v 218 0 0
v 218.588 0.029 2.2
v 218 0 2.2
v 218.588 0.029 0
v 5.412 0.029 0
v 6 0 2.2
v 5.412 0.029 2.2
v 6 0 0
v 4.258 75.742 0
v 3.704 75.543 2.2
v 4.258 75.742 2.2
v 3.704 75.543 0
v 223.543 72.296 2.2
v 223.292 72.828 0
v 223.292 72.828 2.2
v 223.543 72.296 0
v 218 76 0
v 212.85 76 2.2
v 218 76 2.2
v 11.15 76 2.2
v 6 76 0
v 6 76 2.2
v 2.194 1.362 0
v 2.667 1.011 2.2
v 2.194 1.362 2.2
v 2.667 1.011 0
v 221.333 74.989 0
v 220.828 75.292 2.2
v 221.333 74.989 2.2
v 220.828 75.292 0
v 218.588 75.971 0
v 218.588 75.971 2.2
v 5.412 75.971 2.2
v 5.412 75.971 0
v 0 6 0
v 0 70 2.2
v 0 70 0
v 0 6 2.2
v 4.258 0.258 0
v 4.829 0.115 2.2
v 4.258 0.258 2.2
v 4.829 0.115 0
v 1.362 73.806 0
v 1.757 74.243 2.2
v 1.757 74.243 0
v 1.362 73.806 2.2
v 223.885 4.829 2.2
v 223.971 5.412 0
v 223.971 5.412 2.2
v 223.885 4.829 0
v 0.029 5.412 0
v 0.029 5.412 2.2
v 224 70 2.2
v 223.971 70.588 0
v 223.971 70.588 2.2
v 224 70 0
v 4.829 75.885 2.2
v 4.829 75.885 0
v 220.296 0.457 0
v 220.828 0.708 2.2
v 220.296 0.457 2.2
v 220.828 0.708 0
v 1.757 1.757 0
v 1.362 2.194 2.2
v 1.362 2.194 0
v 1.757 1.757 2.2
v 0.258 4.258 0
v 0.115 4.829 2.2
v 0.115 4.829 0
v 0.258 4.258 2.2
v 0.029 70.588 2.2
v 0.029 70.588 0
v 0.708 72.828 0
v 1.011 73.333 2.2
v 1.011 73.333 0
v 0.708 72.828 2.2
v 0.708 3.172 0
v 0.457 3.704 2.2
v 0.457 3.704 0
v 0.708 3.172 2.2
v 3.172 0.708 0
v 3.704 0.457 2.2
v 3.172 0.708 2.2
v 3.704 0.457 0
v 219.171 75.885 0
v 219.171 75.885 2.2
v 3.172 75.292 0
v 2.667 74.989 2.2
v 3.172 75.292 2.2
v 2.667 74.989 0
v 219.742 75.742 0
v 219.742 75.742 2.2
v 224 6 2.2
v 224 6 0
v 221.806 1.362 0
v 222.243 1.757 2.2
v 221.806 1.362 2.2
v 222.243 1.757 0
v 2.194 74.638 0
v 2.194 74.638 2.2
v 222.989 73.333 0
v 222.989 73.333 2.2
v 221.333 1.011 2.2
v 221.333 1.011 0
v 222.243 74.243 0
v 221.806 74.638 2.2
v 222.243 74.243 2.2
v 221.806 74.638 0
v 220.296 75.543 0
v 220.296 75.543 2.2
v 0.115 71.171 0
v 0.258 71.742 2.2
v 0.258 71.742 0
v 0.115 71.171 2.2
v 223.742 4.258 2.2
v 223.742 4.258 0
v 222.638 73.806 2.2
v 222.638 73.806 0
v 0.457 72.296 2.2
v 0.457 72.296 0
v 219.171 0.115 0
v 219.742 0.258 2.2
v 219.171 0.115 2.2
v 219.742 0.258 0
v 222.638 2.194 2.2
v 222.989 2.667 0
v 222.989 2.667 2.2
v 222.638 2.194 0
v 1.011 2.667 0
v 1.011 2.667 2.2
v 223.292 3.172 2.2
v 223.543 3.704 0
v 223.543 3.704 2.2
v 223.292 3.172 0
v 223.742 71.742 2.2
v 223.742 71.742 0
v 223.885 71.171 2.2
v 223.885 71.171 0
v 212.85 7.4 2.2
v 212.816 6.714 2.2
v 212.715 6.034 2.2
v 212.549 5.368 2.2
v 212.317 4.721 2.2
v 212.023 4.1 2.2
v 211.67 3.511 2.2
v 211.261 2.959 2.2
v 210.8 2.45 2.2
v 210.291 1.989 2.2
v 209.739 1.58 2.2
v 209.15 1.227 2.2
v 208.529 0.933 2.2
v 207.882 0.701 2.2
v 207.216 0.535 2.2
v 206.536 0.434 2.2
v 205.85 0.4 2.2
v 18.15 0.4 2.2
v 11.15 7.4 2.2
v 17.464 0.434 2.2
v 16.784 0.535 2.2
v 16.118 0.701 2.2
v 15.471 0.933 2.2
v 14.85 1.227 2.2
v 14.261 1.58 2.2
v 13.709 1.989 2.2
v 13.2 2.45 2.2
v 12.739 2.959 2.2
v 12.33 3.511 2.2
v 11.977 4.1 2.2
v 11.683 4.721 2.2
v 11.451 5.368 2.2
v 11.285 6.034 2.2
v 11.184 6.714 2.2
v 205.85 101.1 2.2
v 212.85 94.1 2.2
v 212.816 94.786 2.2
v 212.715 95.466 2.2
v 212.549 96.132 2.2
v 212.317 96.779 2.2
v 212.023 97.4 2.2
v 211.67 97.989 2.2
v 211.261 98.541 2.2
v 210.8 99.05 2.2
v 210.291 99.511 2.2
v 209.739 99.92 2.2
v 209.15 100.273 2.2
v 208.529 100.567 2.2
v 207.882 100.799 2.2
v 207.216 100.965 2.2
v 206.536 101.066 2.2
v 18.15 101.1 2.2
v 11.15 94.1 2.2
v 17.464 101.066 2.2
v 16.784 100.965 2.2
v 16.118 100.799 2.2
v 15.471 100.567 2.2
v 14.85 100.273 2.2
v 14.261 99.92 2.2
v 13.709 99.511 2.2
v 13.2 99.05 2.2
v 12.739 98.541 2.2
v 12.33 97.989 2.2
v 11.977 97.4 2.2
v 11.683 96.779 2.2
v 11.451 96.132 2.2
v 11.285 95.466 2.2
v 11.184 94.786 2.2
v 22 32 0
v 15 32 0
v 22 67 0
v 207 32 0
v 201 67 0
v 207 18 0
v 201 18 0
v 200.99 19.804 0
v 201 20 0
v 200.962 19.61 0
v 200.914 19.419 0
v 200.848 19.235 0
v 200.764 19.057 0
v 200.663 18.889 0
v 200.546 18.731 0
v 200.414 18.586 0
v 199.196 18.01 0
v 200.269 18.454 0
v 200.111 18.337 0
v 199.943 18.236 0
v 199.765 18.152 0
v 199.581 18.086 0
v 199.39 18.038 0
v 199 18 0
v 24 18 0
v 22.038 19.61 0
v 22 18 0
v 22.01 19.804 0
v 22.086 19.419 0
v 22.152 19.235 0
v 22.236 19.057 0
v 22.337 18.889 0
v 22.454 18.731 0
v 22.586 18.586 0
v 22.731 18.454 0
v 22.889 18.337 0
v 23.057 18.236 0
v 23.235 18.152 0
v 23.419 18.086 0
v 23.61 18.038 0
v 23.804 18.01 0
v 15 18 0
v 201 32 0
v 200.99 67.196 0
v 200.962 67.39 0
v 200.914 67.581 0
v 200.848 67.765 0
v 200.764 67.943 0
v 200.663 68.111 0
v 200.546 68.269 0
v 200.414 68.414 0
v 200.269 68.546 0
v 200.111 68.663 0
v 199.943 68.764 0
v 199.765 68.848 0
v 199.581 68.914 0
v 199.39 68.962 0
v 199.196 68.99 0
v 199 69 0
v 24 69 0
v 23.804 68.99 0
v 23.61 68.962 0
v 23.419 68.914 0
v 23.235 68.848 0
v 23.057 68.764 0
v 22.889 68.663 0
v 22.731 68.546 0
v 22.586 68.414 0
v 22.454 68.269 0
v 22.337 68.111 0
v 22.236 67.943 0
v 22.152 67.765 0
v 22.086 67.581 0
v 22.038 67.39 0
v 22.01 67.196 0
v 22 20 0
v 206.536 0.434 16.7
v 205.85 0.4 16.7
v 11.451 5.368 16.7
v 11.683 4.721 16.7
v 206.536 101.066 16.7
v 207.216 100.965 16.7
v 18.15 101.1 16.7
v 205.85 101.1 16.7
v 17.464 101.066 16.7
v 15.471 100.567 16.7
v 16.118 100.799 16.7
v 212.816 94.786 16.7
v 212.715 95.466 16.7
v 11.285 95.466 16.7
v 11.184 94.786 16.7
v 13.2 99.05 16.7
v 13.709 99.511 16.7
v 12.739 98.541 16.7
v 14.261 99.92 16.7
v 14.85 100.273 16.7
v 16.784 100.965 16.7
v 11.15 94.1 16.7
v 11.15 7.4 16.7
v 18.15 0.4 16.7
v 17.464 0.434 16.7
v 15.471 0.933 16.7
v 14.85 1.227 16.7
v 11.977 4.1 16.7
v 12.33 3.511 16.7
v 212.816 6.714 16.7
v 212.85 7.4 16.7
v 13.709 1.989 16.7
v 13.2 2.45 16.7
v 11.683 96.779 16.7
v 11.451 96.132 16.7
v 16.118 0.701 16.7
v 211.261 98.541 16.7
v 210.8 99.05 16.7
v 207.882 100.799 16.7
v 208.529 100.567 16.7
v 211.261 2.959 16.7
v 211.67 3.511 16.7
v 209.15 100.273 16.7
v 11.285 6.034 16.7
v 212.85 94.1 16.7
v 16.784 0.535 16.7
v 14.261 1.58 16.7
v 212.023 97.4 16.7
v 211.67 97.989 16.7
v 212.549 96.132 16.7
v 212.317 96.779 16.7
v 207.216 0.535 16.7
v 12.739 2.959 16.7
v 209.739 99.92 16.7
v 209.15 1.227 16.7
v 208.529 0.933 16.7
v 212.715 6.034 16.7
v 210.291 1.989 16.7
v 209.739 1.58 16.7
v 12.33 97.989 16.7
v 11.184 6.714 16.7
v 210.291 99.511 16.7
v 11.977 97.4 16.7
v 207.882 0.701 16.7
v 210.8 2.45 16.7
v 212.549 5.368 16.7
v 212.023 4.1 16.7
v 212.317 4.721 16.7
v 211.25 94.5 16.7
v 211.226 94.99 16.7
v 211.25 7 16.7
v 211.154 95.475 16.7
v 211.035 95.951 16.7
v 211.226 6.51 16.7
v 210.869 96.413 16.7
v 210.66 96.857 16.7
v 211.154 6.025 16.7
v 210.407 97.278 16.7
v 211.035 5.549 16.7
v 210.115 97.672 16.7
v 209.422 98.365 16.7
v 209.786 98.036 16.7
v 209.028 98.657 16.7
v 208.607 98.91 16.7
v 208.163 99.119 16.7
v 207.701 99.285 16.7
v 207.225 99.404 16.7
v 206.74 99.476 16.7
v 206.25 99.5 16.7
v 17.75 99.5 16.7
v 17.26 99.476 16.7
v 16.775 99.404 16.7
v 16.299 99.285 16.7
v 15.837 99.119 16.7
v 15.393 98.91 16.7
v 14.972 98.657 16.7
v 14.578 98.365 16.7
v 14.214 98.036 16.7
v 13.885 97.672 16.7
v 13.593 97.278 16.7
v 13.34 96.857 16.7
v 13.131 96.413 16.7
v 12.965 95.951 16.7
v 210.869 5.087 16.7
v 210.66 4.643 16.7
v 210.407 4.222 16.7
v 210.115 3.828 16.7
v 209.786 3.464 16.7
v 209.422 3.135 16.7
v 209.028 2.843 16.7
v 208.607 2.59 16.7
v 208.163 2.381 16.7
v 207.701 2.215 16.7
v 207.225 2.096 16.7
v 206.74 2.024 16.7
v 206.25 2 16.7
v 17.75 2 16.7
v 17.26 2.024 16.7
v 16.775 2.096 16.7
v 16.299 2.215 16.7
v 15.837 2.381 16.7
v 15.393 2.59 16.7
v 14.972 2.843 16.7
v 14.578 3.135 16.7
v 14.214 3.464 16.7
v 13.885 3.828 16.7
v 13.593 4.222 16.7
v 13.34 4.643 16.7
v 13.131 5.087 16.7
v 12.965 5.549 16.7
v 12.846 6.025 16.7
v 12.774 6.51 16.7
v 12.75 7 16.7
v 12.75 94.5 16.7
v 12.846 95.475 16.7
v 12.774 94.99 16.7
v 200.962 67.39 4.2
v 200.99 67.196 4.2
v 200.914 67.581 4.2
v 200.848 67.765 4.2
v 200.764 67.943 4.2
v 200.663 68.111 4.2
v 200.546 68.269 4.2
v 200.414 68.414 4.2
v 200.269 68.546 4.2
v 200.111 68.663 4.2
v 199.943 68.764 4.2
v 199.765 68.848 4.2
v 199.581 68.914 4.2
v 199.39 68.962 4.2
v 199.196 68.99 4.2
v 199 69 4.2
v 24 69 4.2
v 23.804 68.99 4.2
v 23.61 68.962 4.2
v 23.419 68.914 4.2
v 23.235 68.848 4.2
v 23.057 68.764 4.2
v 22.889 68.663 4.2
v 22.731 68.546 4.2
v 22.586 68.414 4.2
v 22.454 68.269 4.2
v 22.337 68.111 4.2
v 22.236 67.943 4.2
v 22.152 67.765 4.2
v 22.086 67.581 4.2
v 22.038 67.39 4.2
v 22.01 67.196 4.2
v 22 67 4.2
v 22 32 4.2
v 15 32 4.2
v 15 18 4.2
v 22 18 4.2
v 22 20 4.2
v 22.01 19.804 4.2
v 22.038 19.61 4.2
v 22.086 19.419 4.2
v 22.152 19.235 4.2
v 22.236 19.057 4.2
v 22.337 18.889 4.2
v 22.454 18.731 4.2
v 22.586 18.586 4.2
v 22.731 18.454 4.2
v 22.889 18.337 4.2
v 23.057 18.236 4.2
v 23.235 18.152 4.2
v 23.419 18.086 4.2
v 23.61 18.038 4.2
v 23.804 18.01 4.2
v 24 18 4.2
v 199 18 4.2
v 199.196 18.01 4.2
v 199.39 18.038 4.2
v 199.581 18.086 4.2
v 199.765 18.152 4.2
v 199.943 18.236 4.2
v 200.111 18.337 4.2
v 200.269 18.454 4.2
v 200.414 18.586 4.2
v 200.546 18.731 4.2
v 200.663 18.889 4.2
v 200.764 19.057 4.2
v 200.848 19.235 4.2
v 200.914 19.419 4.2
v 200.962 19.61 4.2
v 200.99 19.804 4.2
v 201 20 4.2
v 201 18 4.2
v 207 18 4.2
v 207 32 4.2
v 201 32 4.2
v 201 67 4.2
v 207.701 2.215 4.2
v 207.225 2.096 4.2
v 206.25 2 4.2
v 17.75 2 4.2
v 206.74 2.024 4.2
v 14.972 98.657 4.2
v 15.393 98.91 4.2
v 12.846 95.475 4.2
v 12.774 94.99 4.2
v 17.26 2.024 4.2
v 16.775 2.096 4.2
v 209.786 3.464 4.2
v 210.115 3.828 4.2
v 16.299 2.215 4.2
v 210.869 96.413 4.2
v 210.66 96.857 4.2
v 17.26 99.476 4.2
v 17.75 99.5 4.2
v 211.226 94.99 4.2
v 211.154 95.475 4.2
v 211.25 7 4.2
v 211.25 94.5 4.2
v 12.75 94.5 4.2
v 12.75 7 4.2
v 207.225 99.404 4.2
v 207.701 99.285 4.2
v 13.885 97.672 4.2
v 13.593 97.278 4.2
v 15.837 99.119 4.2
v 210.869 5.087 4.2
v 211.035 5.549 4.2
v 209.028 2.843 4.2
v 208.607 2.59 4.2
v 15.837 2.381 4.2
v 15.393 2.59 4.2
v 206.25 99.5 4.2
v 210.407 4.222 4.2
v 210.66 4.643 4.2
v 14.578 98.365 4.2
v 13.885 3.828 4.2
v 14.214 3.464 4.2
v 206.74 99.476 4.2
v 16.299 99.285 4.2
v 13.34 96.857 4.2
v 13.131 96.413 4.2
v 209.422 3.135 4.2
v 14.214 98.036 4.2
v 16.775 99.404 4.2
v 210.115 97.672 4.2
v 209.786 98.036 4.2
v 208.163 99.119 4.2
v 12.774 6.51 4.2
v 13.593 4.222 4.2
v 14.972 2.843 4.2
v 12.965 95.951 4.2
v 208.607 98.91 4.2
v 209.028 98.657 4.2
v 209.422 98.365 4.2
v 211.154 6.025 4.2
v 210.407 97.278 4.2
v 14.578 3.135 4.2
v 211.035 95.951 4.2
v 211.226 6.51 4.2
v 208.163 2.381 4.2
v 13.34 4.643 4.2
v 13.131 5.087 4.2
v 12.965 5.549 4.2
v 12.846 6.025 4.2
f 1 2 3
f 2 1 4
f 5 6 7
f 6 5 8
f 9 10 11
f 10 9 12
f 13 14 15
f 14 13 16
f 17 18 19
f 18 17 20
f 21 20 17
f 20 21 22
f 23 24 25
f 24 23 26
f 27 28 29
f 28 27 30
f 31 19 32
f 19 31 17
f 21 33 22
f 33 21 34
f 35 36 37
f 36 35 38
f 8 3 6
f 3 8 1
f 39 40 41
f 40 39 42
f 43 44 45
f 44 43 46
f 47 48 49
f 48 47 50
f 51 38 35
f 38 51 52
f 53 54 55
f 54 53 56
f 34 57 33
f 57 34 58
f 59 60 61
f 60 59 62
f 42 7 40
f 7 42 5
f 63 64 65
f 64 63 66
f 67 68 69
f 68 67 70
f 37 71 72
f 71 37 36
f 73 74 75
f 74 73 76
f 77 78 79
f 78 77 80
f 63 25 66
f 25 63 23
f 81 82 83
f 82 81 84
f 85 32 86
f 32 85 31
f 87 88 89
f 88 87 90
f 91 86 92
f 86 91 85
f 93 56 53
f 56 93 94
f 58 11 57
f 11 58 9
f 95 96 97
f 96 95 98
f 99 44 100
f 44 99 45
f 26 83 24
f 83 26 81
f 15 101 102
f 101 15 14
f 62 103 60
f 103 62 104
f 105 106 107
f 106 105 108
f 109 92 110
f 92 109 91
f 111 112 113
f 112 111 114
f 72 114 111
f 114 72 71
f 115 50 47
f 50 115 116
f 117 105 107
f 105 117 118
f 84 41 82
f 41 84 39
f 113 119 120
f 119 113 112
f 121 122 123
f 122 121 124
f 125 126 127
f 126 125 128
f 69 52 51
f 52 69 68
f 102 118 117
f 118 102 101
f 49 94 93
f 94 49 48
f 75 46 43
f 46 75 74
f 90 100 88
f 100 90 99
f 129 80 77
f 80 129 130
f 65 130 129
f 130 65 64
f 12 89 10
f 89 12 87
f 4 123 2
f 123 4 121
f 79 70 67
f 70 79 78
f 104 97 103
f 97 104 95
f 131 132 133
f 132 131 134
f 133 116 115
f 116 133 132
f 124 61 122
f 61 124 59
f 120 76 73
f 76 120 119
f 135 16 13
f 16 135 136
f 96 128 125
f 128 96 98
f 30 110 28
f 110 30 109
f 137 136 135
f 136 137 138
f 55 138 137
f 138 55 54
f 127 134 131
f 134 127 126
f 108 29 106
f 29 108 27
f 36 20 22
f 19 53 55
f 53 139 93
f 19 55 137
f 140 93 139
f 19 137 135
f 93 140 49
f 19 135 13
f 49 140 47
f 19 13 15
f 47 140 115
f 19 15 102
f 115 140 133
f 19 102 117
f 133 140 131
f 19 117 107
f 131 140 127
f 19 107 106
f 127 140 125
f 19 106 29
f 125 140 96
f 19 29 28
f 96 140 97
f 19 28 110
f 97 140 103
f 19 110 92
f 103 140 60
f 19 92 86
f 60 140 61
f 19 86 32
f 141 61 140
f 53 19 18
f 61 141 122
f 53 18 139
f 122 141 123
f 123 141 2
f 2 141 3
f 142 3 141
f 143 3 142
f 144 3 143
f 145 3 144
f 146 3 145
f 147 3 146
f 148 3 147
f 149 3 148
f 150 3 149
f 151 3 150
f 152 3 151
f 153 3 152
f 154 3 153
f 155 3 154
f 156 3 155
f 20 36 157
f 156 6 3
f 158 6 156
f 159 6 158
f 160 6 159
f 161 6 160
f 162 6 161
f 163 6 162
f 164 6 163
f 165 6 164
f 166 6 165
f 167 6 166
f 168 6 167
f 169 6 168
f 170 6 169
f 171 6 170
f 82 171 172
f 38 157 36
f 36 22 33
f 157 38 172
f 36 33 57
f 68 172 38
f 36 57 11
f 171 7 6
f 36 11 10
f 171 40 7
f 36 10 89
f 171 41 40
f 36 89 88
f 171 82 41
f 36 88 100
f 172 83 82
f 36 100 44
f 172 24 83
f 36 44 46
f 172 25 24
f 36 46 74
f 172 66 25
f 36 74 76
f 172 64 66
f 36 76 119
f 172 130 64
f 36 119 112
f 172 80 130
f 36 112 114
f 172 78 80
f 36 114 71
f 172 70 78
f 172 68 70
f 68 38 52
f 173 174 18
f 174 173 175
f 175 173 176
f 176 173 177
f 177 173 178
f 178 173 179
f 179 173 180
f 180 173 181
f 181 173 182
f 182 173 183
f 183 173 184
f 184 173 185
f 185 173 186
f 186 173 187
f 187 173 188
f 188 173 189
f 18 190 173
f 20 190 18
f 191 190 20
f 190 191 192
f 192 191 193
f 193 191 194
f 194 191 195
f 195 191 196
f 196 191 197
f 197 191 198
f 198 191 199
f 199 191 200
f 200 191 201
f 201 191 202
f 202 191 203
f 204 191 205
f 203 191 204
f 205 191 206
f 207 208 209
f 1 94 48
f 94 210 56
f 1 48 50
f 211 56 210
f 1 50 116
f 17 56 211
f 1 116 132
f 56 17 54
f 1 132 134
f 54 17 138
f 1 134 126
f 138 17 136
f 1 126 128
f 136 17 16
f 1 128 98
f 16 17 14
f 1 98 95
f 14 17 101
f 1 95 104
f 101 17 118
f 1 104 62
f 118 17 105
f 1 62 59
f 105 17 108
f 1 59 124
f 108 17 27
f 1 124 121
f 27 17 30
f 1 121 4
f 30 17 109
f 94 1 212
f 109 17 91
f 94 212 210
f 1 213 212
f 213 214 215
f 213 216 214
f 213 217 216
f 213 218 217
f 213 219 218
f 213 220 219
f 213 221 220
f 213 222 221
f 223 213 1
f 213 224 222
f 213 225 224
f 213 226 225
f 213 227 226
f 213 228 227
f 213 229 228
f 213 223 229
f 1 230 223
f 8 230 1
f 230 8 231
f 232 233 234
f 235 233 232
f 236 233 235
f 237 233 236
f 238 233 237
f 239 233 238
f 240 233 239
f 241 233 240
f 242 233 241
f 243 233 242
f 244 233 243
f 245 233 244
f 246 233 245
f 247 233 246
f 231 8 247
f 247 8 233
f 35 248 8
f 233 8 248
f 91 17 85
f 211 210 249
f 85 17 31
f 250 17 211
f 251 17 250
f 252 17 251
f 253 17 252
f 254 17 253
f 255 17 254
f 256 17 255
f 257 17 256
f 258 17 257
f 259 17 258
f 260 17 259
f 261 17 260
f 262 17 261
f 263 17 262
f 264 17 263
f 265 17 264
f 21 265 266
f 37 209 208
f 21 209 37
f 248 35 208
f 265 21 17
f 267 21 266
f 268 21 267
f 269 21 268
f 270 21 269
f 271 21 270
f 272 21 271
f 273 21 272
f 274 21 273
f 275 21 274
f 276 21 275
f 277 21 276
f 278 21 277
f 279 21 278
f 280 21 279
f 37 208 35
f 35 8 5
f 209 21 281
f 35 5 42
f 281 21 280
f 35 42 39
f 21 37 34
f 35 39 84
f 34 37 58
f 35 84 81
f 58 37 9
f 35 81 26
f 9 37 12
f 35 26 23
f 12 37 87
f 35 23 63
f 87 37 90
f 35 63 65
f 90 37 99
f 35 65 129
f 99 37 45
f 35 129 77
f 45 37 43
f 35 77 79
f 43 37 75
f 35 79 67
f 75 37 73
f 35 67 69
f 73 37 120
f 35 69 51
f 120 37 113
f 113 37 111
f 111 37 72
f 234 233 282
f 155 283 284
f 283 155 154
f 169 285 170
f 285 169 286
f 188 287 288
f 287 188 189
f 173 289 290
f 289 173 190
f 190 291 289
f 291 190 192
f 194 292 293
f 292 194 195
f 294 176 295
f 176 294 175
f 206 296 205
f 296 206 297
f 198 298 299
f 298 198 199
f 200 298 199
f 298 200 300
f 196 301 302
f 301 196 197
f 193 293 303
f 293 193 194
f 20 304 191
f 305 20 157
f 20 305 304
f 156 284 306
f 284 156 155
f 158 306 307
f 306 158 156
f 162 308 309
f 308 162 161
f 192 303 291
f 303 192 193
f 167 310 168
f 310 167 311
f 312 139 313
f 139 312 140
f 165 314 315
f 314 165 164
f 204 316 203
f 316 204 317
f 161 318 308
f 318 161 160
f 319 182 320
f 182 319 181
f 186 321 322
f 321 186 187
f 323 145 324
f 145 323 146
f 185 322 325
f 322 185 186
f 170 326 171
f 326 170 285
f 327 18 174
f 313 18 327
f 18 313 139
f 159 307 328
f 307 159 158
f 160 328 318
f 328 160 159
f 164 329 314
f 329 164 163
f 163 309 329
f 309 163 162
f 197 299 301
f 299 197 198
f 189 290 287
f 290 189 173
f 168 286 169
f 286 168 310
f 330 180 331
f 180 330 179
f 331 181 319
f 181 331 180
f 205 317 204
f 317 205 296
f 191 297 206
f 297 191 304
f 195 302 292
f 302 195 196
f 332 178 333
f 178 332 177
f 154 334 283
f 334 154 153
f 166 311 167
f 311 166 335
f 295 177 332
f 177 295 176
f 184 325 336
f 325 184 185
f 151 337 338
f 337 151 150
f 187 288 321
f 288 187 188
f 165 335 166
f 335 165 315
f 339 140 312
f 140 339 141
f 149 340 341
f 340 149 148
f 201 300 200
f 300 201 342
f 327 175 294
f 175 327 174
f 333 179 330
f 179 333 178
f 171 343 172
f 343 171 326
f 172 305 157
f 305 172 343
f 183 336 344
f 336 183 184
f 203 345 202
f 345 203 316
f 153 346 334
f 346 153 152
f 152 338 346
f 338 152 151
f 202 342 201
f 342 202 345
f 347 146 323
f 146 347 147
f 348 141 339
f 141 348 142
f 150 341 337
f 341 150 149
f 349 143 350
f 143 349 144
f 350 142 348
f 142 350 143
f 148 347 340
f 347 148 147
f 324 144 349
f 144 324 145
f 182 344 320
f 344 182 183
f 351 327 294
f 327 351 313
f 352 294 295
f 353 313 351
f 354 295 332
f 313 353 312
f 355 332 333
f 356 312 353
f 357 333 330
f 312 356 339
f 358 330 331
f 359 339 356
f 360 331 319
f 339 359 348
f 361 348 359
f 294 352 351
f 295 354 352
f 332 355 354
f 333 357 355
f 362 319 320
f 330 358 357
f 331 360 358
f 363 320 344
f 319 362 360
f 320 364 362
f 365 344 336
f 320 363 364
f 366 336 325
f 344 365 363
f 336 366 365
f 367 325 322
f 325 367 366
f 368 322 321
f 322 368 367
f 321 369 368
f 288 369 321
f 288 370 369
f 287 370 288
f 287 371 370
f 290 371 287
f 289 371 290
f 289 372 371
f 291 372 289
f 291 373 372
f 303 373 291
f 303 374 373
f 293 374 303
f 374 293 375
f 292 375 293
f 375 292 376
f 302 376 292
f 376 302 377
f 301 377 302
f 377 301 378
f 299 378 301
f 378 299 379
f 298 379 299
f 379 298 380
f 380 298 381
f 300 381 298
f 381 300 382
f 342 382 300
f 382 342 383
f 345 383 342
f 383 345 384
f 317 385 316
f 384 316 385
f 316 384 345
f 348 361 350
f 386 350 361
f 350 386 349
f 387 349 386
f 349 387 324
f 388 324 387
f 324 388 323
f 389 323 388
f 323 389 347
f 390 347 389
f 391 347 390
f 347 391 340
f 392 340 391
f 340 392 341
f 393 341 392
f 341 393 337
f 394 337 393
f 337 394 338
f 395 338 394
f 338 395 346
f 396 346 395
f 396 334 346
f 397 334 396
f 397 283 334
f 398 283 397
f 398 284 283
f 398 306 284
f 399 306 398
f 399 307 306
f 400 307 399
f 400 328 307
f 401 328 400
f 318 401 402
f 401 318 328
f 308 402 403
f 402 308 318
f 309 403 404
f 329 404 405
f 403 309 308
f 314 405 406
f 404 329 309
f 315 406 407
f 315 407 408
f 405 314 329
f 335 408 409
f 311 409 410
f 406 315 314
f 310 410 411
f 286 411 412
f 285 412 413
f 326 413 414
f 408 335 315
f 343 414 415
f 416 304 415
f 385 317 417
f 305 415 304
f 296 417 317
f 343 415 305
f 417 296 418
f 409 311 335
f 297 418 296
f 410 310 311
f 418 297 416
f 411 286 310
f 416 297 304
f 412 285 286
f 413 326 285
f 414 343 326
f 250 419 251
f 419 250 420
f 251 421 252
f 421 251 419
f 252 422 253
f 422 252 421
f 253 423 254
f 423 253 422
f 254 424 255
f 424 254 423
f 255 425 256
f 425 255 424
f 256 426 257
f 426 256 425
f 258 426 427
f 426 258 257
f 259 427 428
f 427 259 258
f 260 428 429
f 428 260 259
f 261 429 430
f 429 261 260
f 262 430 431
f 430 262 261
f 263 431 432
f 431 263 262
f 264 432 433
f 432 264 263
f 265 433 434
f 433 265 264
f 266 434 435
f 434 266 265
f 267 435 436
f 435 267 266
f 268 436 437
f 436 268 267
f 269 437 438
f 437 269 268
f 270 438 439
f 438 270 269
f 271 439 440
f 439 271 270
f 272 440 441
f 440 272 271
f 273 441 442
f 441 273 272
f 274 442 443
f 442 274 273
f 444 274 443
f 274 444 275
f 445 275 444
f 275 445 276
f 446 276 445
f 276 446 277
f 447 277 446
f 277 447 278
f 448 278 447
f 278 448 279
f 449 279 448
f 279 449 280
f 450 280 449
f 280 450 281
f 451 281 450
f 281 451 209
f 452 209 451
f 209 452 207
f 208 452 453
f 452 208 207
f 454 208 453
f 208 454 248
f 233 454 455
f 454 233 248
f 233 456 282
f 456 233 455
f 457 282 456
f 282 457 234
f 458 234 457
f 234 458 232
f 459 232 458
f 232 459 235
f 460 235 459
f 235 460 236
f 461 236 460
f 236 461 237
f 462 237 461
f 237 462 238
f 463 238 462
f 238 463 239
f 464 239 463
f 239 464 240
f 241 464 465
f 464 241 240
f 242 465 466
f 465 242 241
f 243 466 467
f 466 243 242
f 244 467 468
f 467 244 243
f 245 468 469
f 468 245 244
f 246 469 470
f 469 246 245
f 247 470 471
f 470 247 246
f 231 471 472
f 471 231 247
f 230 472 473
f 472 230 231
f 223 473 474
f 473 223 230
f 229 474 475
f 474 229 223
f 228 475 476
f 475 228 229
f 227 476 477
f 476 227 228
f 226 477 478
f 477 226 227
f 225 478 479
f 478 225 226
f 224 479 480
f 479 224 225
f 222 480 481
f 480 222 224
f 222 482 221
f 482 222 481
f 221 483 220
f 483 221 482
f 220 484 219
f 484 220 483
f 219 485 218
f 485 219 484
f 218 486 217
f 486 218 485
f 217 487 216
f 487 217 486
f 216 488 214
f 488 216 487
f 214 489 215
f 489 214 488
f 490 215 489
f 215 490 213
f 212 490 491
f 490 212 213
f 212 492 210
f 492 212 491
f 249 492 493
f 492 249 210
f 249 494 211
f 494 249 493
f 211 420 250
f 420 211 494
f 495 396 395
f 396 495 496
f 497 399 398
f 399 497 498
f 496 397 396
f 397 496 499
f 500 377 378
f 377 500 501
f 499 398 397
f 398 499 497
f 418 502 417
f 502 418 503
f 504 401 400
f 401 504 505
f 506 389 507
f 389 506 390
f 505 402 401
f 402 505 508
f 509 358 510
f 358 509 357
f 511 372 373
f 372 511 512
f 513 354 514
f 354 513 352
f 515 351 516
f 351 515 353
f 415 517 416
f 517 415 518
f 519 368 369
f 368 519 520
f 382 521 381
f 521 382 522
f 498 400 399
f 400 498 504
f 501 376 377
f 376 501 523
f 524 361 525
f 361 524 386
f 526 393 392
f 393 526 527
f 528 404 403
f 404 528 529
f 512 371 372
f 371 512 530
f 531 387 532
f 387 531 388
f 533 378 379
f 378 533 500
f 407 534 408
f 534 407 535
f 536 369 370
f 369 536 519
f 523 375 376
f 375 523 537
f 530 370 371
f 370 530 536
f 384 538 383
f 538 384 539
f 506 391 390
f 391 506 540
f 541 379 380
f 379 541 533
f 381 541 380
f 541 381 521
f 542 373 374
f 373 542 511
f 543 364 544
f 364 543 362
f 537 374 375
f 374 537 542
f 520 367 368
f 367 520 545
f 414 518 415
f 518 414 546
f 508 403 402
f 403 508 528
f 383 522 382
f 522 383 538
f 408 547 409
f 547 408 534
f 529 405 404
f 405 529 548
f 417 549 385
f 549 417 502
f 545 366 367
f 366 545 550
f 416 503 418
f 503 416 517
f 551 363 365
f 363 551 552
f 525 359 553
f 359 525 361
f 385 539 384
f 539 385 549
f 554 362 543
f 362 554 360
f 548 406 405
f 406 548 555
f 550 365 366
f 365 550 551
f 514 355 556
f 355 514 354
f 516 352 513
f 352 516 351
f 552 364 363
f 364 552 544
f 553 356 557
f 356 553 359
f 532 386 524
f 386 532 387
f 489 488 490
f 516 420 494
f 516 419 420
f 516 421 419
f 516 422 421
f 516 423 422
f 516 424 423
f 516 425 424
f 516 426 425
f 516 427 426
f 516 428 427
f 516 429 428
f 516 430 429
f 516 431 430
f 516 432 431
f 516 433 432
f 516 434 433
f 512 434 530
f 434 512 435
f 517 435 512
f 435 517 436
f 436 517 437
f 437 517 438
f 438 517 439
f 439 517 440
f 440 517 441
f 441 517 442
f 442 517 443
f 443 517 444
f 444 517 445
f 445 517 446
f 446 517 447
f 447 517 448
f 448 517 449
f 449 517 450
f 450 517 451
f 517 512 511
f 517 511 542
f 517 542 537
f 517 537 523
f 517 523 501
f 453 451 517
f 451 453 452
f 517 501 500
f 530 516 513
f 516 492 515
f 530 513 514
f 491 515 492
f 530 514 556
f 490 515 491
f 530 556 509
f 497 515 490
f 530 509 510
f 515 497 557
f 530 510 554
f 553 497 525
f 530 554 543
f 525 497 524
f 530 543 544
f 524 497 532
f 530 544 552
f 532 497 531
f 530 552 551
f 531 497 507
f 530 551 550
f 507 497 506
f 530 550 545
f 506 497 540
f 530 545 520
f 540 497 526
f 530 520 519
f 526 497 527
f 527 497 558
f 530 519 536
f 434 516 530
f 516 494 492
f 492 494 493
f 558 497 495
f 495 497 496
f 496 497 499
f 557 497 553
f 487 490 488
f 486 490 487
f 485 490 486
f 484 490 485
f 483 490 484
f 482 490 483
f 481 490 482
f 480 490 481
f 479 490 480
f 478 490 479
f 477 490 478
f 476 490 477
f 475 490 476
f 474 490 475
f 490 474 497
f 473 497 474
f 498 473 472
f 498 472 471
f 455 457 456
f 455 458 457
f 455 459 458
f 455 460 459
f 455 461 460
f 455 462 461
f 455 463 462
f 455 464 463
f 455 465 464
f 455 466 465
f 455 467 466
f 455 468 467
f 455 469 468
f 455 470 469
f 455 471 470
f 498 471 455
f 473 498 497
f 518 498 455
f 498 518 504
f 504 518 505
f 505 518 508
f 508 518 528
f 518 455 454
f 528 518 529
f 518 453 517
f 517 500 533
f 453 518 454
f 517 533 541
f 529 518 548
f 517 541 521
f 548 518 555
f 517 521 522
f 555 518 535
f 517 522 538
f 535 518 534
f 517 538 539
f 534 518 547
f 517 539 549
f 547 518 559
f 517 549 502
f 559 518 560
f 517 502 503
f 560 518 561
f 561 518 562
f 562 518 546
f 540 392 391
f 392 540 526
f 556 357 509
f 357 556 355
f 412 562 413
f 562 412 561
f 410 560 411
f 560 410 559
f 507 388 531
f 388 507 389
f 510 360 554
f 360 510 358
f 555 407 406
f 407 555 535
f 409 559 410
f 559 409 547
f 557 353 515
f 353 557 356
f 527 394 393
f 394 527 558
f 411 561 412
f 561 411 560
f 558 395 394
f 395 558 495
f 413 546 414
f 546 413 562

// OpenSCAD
// Prado 2018 Radio Trim v5 — Flat fitment revision
// Built from 2026-03-11 physical test-fit notes
//
// Intent:
// - Ignore dash angle for now
// - Reduce the rear insert size slightly because the last print was a few mm too large
// - Limit insertion depth to the measured 15mm allowance behind the fascia
// - Preserve the "good" 18mm bottom datum
// - Pull the top edge down to a 7mm visible gap above the Sony chassis opening
// - Add lower L-shape relief around the Sony opening from the hand sketch
//
// This is a fitment shell, not the final retention design.
// No clips or hooks yet — the goal is to validate the front geometry first.

// ── Core dimensions from latest fitment ─────────────────────

sony_w = 179;             // Sony DIN chassis opening clearance
sony_h = 51;

bottom_gap = 18;          // Measured "good" distance from lower cutout edge
top_gap = 7;              // Needed visible fill above Sony opening

left_top_fill = 22;       // Width from opening edge to left outer face (top section)
right_top_fill = 23;      // Width from opening edge to right outer face (top section)
left_lower_fill = 15;     // Width from opening edge to left outer face at lower notch
right_lower_fill = 17;    // Width from opening edge to right outer face at lower notch

lower_relief_h = 14;      // Assumption: lower L-shape relief height, kept explicit for easy tuning

// Derived front bezel dimensions
bezel_w = sony_w + left_top_fill + right_top_fill;
bezel_h = sony_h + bottom_gap + top_gap;

// Rear insert body
body_w = 202.5;           // Reduced a few mm from prior 205mm shell
body_h = 101.5;           // Reduced a few mm from prior 104mm shell
body_r = 7;
body_depth = 14.5;        // Stay within measured 15mm allowance

bezel_t = 2.2;
wall = 2.0;
fit_clearance = 0.8;      // Slightly looser than the prior shell
face_corner_r = 6;
sony_r = 2;

// Align the bezel to the bottom datum that already fit well.
body_x = (bezel_w - body_w) / 2;
body_y = 0;

// Sony opening position inside the bezel
sony_x = left_top_fill;
sony_y = bottom_gap;

// Lower notch relief widths needed versus the top opening width.
left_relief = left_top_fill - left_lower_fill;
right_relief = right_top_fill - right_lower_fill;

$fn = 64;

module rounded_rect_2d(w, h, r) {
    offset(r) offset(-r)
        square([w, h]);
}

module sony_opening_profile() {
    union() {
        translate([sony_x, sony_y])
            rounded_rect_2d(sony_w, sony_h, sony_r);

        // Lower L-shape clearance from the hand sketch.
        if (left_relief > 0)
            translate([sony_x - left_relief, sony_y])
                square([left_relief, lower_relief_h]);

        if (right_relief > 0)
            translate([sony_x + sony_w, sony_y])
                square([right_relief, lower_relief_h]);
    }
}

module trim_v5_flat() {
    difference() {
        union() {
            // Visible front bezel driven by the latest sketch measurements.
            linear_extrude(bezel_t)
                rounded_rect_2d(bezel_w, bezel_h, face_corner_r);

            // Rear insert body used only for cavity fit validation.
            translate([body_x + fit_clearance/2, body_y + fit_clearance/2, bezel_t])
            linear_extrude(body_depth)
                rounded_rect_2d(
                    body_w - fit_clearance,
                    body_h - fit_clearance,
                    body_r
                );
        }

        // Main pass-through opening for the Sony chassis plus lower relief.
        translate([0, 0, -1])
        linear_extrude(bezel_t + body_depth + 2)
            sony_opening_profile();

        // Hollow the rear body to keep this as a fast, low-risk fitment print.
        translate([body_x + wall, body_y + wall, bezel_t + wall])
        linear_extrude(body_depth + 1)
            rounded_rect_2d(
                body_w - wall * 2,
                body_h - wall * 2,
                max(body_r - wall, 1)
            );
    }
}

trim_v5_flat();
